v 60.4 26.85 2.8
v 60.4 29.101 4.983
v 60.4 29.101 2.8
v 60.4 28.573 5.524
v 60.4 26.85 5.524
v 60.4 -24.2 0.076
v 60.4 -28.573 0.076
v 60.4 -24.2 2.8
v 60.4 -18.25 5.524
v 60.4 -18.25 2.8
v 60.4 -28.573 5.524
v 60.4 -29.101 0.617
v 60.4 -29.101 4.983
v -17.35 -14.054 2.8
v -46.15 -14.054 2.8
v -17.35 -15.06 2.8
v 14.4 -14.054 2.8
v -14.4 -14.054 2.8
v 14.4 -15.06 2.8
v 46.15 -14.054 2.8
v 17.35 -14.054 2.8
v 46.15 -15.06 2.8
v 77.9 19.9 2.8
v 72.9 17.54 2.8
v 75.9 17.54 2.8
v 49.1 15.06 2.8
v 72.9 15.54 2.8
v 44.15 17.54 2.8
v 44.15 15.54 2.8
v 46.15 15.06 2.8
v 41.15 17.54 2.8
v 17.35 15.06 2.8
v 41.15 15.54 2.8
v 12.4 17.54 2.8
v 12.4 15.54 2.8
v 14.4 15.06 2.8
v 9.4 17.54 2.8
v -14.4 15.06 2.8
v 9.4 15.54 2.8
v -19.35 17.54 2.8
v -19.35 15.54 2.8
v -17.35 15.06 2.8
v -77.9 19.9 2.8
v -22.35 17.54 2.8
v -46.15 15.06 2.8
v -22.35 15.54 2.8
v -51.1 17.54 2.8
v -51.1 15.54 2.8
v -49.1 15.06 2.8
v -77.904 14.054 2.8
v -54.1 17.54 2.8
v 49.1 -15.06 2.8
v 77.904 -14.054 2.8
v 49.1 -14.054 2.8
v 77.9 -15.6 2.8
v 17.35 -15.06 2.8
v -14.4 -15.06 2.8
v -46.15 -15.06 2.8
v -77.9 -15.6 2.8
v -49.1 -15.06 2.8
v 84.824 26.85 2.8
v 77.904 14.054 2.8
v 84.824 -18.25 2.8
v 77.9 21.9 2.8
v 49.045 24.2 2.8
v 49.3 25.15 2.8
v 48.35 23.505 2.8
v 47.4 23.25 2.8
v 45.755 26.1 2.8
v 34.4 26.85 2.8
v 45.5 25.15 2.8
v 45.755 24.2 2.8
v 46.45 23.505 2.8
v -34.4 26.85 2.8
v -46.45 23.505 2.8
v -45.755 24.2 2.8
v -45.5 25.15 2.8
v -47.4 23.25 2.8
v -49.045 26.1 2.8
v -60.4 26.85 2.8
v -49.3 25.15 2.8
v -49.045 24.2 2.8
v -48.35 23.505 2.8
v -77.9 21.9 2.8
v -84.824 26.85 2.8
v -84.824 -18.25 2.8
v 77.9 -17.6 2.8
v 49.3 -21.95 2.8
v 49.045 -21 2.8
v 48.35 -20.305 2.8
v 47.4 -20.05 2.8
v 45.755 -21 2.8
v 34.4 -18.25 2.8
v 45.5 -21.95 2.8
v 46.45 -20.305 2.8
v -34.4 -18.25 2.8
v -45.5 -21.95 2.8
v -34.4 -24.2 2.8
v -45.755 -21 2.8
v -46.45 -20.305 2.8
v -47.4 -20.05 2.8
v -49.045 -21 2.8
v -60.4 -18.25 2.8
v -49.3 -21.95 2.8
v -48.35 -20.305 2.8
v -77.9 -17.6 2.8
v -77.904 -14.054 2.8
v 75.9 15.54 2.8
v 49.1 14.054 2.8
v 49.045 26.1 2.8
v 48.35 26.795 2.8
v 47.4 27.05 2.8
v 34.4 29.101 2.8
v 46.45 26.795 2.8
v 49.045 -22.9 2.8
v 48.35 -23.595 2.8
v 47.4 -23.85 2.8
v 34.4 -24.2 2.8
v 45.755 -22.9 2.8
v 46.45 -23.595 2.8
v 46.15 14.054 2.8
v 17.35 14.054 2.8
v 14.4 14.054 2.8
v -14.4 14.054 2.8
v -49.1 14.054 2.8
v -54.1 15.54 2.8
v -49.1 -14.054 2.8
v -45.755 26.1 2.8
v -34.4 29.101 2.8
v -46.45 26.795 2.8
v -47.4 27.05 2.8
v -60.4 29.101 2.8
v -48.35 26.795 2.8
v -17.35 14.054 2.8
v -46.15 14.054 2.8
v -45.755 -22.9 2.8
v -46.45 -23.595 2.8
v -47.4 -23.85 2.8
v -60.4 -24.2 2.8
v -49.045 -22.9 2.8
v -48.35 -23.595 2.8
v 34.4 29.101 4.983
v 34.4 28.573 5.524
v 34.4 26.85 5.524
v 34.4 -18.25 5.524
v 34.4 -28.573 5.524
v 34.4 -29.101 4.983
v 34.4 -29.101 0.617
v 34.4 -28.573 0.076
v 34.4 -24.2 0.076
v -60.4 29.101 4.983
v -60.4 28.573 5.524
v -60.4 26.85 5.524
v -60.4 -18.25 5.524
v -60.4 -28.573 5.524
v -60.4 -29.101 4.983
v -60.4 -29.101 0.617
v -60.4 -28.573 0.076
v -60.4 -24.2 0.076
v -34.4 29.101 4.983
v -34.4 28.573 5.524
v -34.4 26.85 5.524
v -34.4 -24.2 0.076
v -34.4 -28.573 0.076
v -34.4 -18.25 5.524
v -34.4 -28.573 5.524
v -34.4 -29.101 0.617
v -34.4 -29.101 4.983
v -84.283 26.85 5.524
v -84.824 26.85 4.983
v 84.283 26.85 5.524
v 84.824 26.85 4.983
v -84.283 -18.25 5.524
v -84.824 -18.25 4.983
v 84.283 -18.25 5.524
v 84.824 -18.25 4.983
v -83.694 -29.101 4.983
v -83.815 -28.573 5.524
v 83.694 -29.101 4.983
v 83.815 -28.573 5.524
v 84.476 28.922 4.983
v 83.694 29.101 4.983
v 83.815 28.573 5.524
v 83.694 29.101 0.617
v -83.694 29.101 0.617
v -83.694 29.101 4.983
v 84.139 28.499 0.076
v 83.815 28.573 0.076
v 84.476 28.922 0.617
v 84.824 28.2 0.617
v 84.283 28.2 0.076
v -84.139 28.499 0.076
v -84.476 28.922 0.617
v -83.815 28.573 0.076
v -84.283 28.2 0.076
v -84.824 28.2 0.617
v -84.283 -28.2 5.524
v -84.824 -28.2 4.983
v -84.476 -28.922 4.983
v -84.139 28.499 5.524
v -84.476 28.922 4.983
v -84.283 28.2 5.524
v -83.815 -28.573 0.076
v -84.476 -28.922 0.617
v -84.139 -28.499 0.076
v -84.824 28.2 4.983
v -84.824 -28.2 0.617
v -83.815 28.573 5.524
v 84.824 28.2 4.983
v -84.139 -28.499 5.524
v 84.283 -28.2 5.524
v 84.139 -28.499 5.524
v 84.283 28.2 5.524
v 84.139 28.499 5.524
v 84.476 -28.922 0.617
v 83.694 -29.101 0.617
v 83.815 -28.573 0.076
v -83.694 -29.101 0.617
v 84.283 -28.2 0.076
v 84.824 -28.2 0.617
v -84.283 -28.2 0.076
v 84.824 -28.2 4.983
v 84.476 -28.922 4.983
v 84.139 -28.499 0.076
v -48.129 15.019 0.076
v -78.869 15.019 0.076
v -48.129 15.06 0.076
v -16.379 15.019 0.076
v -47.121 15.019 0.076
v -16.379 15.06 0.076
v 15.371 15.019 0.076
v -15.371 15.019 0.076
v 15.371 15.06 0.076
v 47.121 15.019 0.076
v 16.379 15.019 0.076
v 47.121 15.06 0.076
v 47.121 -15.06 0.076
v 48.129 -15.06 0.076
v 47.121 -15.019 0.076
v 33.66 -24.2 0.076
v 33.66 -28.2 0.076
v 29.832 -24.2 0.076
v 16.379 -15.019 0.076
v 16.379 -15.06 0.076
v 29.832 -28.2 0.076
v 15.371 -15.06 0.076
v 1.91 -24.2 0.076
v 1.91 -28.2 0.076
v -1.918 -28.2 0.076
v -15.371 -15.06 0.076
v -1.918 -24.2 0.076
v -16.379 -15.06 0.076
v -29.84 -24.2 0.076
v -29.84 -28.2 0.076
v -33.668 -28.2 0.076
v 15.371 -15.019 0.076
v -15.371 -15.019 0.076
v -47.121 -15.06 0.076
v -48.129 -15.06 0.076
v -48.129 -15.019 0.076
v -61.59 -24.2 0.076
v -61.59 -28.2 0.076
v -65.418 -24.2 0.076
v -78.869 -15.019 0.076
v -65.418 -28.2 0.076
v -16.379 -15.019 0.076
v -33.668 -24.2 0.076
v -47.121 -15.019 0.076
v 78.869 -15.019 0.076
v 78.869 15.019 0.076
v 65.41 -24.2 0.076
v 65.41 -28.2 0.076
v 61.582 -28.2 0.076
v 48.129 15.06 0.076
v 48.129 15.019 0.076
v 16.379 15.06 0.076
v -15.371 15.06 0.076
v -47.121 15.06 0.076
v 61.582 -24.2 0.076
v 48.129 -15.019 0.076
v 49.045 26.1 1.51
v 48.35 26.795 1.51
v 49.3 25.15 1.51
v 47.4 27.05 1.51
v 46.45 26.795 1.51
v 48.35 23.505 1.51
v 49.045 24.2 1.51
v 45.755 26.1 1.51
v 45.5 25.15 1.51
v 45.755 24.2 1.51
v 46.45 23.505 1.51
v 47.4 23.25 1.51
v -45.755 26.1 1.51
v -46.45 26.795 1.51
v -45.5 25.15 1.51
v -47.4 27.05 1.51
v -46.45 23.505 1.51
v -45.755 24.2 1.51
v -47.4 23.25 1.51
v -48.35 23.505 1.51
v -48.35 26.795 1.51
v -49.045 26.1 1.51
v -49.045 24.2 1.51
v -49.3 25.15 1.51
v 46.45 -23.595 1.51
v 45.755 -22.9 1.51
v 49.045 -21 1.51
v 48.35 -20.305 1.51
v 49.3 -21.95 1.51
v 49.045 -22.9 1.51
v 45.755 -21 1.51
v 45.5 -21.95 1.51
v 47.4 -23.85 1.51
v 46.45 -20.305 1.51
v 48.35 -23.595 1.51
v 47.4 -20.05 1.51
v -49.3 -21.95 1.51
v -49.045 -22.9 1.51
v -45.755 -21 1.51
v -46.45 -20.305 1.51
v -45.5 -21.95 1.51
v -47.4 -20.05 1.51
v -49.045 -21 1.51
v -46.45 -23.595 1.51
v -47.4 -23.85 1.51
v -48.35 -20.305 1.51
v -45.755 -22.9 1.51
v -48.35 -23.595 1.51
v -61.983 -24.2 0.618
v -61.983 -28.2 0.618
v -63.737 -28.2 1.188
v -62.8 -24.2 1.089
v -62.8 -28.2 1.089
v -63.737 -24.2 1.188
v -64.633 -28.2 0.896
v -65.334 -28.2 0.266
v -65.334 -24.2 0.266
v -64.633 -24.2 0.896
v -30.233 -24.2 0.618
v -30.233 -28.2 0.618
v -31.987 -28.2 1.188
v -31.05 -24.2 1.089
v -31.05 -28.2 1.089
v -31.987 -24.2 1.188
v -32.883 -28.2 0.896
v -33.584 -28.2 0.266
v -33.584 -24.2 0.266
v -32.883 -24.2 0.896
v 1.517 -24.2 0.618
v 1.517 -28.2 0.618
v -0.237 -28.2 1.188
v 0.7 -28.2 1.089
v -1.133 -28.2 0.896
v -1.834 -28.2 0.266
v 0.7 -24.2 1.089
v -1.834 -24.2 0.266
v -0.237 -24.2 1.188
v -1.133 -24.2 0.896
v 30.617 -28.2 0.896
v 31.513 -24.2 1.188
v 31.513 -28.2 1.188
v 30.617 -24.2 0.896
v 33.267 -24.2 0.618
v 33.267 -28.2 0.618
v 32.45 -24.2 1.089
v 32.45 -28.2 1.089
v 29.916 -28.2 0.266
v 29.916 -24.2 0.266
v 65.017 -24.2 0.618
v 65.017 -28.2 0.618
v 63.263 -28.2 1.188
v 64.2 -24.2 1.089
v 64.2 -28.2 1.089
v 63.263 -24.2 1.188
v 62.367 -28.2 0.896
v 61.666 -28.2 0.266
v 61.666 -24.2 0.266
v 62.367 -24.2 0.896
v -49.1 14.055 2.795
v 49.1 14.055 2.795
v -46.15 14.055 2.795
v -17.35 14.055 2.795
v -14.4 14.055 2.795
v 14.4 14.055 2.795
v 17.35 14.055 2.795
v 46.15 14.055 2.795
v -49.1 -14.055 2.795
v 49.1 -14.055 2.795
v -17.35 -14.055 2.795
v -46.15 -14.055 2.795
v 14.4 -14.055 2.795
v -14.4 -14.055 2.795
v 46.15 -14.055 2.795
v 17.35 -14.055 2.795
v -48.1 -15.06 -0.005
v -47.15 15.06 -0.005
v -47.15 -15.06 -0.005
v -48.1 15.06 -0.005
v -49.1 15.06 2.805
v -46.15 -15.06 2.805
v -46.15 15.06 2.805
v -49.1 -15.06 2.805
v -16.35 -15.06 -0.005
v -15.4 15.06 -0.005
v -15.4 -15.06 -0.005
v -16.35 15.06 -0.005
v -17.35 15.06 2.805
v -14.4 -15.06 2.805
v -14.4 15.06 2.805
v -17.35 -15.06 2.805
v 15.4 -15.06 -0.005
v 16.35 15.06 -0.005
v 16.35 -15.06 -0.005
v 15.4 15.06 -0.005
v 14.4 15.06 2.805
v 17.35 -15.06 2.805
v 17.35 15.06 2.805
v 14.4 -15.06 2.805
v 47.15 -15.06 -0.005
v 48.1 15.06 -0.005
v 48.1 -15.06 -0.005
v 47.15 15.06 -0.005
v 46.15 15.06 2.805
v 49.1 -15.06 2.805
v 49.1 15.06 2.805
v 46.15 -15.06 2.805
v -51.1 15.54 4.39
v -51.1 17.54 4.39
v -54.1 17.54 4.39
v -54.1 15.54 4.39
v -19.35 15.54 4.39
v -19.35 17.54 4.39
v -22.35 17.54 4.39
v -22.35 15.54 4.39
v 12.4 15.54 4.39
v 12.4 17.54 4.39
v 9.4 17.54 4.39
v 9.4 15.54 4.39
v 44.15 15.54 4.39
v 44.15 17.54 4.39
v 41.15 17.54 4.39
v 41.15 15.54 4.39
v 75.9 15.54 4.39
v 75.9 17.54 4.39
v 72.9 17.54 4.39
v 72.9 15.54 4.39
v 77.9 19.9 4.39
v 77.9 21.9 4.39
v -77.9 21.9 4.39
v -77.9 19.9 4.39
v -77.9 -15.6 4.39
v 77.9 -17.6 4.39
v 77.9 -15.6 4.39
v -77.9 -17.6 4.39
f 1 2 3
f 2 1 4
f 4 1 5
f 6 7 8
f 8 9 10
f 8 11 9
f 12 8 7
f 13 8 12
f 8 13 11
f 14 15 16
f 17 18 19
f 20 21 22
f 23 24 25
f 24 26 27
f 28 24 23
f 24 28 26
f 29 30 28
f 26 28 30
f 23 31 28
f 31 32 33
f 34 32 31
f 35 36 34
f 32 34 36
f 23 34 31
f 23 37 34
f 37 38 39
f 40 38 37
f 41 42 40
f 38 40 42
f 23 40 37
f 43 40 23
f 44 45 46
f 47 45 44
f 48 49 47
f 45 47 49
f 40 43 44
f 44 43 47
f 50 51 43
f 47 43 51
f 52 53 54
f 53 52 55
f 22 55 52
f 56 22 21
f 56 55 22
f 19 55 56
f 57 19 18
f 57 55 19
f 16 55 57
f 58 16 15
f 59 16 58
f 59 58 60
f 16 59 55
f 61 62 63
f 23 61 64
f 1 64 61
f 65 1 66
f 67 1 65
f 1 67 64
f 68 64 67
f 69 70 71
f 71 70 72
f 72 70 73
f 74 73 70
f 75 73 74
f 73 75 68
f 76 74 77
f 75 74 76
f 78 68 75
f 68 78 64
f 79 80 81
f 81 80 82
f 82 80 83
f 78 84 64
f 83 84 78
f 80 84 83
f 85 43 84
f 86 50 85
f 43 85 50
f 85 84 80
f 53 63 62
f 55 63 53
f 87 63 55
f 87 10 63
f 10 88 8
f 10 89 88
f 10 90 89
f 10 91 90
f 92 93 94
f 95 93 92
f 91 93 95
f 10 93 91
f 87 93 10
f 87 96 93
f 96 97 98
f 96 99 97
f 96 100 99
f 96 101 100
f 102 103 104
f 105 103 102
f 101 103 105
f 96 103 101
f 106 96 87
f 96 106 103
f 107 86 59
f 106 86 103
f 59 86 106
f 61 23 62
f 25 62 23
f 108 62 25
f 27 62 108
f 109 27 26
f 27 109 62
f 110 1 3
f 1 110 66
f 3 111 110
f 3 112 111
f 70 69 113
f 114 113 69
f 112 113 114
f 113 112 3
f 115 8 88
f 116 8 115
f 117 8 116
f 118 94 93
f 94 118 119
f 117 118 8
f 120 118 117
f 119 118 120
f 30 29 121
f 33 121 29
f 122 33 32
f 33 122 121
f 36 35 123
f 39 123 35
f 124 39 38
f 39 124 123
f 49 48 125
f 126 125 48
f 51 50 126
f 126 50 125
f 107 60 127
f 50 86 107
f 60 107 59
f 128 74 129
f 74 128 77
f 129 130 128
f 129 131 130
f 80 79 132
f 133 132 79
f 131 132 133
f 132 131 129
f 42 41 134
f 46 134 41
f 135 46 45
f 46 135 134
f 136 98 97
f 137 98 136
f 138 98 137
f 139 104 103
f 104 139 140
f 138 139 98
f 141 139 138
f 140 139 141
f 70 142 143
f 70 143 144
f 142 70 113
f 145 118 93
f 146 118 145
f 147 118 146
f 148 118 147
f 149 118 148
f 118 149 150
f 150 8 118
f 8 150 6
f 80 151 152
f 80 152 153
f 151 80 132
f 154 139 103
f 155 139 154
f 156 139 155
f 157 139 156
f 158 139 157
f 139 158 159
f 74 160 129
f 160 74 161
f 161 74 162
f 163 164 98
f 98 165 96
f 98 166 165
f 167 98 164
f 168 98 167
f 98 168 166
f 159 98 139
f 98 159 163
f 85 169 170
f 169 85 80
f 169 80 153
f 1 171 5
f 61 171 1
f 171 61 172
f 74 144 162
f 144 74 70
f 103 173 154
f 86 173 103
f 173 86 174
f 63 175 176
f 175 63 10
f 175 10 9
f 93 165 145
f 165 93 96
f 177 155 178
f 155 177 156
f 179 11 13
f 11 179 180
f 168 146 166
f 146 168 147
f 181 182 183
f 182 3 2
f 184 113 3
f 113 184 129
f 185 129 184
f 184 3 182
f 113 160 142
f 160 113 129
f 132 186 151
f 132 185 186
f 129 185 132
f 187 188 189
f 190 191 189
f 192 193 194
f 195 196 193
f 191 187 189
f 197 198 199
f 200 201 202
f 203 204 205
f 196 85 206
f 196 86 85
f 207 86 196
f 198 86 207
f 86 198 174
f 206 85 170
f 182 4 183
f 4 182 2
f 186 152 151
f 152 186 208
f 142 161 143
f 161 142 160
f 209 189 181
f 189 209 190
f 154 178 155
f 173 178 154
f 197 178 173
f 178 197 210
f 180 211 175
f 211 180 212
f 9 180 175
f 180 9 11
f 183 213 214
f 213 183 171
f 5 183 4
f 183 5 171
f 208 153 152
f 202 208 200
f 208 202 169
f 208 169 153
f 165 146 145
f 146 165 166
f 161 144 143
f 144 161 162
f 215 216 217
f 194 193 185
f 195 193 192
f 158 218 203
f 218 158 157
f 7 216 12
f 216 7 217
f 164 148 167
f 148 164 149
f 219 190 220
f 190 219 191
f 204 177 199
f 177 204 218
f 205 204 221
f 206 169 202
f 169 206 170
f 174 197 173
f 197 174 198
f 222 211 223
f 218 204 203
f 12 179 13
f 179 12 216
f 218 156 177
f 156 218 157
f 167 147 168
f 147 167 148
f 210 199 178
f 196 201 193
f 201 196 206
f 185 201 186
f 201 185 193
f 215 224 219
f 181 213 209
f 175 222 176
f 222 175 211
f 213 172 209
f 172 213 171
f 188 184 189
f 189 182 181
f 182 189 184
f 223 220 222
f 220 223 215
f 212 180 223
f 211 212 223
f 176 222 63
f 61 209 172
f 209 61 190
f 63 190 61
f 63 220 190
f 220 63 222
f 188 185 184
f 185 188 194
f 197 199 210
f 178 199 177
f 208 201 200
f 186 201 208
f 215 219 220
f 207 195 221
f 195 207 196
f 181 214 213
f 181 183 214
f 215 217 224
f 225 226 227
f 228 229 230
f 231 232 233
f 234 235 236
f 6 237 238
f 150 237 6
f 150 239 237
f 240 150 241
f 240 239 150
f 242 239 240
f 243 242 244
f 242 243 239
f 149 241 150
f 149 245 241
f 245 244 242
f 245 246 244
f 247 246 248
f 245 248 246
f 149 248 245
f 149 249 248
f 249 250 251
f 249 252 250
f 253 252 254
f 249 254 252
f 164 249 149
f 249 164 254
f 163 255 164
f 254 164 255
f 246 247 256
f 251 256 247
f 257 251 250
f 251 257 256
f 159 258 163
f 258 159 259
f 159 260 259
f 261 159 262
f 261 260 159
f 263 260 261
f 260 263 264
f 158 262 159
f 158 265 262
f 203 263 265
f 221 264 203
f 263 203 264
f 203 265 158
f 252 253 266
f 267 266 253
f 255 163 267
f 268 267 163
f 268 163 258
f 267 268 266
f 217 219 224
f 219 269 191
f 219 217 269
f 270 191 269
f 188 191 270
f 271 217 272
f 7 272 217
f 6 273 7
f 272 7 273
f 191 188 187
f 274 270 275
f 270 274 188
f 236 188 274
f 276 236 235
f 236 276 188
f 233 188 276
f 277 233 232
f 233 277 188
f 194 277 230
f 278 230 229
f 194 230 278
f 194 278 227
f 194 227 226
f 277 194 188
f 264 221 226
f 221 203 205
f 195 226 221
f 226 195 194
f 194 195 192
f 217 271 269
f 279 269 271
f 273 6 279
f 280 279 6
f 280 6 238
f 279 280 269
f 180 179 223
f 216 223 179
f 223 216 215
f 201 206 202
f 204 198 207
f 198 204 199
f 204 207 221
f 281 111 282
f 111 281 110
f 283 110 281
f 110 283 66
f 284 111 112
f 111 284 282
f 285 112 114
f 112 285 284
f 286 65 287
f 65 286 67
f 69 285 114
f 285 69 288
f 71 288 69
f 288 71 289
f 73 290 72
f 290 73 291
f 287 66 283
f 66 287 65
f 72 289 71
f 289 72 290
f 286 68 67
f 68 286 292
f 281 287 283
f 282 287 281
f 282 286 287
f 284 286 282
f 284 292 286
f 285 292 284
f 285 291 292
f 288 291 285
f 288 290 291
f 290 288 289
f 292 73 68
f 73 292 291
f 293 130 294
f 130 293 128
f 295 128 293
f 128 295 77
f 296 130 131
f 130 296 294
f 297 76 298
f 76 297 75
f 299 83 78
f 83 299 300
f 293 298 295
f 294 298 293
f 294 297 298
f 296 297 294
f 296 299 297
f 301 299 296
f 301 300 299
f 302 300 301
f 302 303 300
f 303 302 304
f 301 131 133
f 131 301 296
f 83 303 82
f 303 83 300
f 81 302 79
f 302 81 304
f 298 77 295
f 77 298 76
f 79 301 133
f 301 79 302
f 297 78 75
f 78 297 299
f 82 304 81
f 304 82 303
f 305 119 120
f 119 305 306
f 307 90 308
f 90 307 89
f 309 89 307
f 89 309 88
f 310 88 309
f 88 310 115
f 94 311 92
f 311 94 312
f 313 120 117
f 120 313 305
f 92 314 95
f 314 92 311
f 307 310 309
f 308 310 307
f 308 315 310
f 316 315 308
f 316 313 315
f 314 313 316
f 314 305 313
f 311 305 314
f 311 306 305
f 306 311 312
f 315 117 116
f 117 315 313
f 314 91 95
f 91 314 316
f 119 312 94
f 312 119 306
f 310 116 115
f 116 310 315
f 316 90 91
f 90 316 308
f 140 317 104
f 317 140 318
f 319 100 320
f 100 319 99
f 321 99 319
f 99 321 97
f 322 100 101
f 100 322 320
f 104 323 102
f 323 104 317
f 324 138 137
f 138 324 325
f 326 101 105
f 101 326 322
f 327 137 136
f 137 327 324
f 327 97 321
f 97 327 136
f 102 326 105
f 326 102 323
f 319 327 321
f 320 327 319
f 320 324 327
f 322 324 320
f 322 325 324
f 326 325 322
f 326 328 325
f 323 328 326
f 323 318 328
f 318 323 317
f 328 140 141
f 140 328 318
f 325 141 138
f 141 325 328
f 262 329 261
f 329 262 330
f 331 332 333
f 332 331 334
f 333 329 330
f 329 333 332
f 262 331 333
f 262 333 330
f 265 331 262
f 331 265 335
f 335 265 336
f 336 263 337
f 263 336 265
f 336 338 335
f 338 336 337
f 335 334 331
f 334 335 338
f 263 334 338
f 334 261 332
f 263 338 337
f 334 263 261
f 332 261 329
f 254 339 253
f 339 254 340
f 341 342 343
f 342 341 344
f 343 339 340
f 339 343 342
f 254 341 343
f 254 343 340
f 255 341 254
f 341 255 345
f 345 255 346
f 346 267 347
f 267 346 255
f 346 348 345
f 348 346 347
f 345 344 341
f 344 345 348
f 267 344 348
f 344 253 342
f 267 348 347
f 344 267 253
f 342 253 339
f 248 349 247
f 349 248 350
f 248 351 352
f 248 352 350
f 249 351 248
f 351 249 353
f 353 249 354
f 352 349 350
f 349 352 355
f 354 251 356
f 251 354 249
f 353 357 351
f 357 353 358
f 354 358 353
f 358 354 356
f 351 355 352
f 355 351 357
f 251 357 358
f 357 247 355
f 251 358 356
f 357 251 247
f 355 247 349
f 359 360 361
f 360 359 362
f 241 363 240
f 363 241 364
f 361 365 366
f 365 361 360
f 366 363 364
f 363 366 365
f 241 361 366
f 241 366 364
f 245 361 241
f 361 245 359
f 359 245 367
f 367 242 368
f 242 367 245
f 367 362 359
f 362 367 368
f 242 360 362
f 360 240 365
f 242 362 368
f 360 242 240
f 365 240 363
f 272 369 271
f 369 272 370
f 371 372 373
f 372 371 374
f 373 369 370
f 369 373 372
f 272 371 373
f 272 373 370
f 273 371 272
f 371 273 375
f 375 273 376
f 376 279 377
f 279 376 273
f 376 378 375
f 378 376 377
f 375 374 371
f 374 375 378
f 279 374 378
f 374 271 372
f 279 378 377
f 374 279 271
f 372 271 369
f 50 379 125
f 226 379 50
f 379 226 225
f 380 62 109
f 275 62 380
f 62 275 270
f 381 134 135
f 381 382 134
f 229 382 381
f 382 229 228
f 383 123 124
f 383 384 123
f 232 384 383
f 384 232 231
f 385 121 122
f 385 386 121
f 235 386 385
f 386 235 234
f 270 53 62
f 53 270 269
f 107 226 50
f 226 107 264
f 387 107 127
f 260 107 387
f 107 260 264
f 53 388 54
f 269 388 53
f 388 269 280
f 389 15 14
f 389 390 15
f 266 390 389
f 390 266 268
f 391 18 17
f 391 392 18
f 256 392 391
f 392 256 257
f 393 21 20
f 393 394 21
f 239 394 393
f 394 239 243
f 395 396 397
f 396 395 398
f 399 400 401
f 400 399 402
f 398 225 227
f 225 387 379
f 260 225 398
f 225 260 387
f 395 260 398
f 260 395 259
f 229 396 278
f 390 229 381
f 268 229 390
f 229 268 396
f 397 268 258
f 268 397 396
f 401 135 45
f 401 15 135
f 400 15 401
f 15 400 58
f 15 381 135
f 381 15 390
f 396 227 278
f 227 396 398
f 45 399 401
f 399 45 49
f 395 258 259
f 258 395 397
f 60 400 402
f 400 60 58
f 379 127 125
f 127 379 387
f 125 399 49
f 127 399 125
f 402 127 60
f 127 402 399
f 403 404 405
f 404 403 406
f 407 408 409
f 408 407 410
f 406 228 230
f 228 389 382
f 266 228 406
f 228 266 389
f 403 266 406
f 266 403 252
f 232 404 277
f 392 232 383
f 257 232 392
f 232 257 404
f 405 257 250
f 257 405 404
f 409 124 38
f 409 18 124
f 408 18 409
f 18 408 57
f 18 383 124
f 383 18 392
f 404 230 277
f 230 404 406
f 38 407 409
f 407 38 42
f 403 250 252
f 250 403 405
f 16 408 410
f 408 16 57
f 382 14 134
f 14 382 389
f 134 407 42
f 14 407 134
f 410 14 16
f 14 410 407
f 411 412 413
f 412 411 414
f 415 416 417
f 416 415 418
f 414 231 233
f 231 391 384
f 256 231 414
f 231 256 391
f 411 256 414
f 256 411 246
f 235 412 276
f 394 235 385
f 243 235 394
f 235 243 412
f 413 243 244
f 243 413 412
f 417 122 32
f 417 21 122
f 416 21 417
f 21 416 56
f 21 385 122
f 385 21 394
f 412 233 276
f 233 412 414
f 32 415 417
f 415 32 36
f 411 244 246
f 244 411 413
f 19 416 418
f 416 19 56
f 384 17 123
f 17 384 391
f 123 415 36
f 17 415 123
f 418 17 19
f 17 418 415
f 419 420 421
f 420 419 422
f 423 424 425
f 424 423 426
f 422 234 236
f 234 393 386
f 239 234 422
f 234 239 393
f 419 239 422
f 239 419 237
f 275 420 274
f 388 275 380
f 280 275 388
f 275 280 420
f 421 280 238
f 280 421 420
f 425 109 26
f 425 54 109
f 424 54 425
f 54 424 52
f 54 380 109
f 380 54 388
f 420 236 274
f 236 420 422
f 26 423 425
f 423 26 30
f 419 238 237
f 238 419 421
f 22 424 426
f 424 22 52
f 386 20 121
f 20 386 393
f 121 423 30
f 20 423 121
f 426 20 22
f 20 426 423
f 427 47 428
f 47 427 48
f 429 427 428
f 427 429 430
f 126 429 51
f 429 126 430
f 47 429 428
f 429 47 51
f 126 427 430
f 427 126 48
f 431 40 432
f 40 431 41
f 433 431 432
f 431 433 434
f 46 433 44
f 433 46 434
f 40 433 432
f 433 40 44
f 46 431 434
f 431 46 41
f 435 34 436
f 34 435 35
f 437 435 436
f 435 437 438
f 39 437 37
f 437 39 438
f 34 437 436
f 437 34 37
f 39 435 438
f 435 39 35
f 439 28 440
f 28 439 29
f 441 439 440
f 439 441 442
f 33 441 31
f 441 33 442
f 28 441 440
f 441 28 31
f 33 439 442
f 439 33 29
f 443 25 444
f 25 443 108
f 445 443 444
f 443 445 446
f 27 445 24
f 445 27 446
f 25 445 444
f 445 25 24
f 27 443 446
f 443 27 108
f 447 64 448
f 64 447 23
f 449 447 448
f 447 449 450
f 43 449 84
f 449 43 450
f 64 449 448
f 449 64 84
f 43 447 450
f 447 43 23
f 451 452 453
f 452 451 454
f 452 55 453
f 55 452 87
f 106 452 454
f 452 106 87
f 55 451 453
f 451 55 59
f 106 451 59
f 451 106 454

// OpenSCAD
// -*- mode: SCAD ; c-file-style: "ellemtel" ; coding: utf-8 -*-
//
// Holder to scan 126 film strips with a Reflecta ProScan 10T
//
// Copyright 2018 Roland Sieker <ospalh@gmail.com>
// Licence: CC-BY-SA 4.0


/* [Global] */


// ... to preview. You will get both parts when you click "Create Thing".
part = "halter"; // [halter: film holder, einsatz: film holder clamp]

// Set this to "render" and click on "Create Thing" when done with the setup.
preview = 1; // [0:render, 1:preview]

/* [Holder] */

// Width of the holder. This one and the next one are the two values you do need to set up for your scanner. Preset is for a Reflecta proScan. Maybe subtract half a millimtre for a better fit.
holder_width = 58.4;  // [20:0.1:150]

// Height or thickness of the holder. See above. You know they were too high when you need a mallet to go from one image to the next...
holder_thickness = 5.6;  // [3:0.1:10]

// How many exposures on the longest strips you want to fit into this. Make sure the resulting holder still fits onto your print bed.
images_per_strip = 5;  // [1:1:8]

// Different manufacturers' scanner place their little catches to position the holder at different sides.
position_notch_side = 90;  // [90: bottom, 0: side]

/* [Magnets] */

// Diameter of the magnet hole. Add clearance by hand here. Set to 0 for no magnet holes.
magnet_diameter = 3.8;  // [0:0.1:15]
// Height or thickness of the magnet. Make sure to use magnets flat enough to fit.
magnet_height = 1;  // [0.5:0.1:3]

/* [Hidden] */

// Das ganze Filmgroessen-Geraffel wieder verstecken: ein thing pro
// Film. Teil der Automatik (mit/ohne Stege, Lang-oder Kurzkerbe) sind so
// halbwegs inaktiv.


// Width of the film
film_width = 35;  // [8:0.1:70]
// Length from the left edge of an exposure to its right edge
image_width = 28.8; // [8:0.1:100]
image_pitch = 127/4;  // Ein Viererstreifen ist genau 127 mm lang. Das ist
// irgendwie was rundes in Zoellen. Das muss mich nicht scheren.

// Size of an exposure from bottom to top.
image_height = 28.1; // Hat sich was, "quadratishc". Nachmessen hat ergeben, dass die Bilder etwas breiter als hoch sind.
rand_unten = 5.6;  // Koennten 7/32 Zoll sein. What TF ever. Ich koennte 118 Schweizerfranken bezahlen und es im Standard nachlesen. Oder das Geld sparen
rand_oben = film_width - image_height - rand_unten;
echo("rand_oben", rand_oben);

bildabstand = max(image_pitch, image_width);
l_filmsteg = max(0, bildabstand-image_width);
r_r = 1.0;  // Rundungsradius
// Auch wichtig:
l_zk = 4;  // Laenge Zentrierkerbe
b_zk = 4;  // Breite Zentrierkerbe
h_zk = 1.2;  // Tiefe der Zentrierkerbe
w_zk = 1;  // Wand bzw Abstand der Zentrierkerbe vom Rand

min_l_ksteg = 0.8;

l_griff = 25;
o_griff = 25;
w_griff = 3;


w_schraeg = 1;  // Breite der Abschraegung rund um die Filmfenster

kurzsteg_grenze = w_schraeg;  // Weniger als 1 mm pro Seite: Kurzstege

mit_langsteg_oben = ( rand_oben >= kurzsteg_grenze);
mit_langsteg_unten = ( rand_unten >= kurzsteg_grenze);


w_steg = 2;  // Breite fuer Stuecke, die den Film zentrieren.
l_kurzsteg = 0.4*bildabstand;  // Laenge fuer Stuecke, die den Film zentrieren,
// wenn wir keine Fensterstege machen


magnet_off_oben = -2;
magnet_off_unten = 1.2;

w_filmloch = 2.5; // Ein zehntel Zoll?
l_filmloch = 3.5; // ca. 35/254 Zoll.
// dy_fl_bl = 1.25; // Abstand Filmloch oben zum Blidbereich
dy_fl_k = 1.86;  // Abstand Filmloch unten zur Filmkante
dx_fl_rl = 1.75;  // Abstand Filmloch links zum Rahmen links

// *******************************************************
// Extra parameters. These can be changed reasonably safely.


w = 1.8;  // Wall width
p = 1.2;  // Bottom, top plate height
c = 0.5;  // Clearance
c_z = 0.3;  // Clearance in z direction. Mostly for the magnet hole and centering ridge
angle = 60; // Overhangs much below 60 degrees are a problem for me


// Halbwegs wichtig
h_steg = 1.6;  // Hoehe fuer Stuecke, die den Film zentrieren.
h_nut = h_steg + c_z;  // Tiefe fuer Stuecke, auf denen der Film nicht aufliegt



// *******************************************************
// Some shortcuts. These shouldn't be changed

tau = 2 * PI;  // pi is still wrong. tau = circumference / r

xy_factor = 1/tan(angle);
// To get from a height to a horizontal width inclined correctly
z_factor = tan(angle);  // The other way around

some_distance = 1.2 * holder_width;
ms = 0.01;  // Muggeseggele.

// fn for differently sized objects and fs, fa; all for preview or rendering.
pna = 40;
pnb = 15;
pa = 5;
ps = 1;
rna = 180;
rnb = 30;
ra = 1;
rs = 0.1;
function na() = (preview) ? pna : rna;
function nb() = (preview) ? pnb : rnb;
$fs = (preview) ? ps : rs;
$fa = (preview) ? pa : ra;

// l_fenster = bildabstand * images_per_strip;
l_fenster = bildabstand * (images_per_strip - 1) + image_width;
l_rand = 2 * w_steg + w_schraeg + 2;
w_rand = w_schraeg + 7;
l_ue_a =  l_fenster + 2*l_rand;
w_einsatz = image_height + 2 * w_rand;
h_bd = holder_thickness/2;  // Hoehe Boden oder Deckel

to_griff = l_ue_a/2 - o_griff - l_griff/2;



// *******************************************************
// End setup




// *******************************************************
// Generate the parts


print_part();
// filmhalter();
// einsatz();
// preview_parts();
// stack_parts();



module print_part()
{
   if ("halter" == part)
   {
      filmhalter();
   }
   if ("einsatz" == part)
   {
      einsatz();
   }
}

module preview_parts()
{
   filmhalter();
   translate([0, some_distance, 0])
   {
      einsatz();
   }
}

module stack_parts()
{
   // intersection()
   {
       // color("yellow")
      {
         filmhalter();
      }
      translate([0,0,holder_thickness + ms])
      {
         rotate([0,180,0])
         {
            // color("red")
            {
               einsatz();
            }
         }
      }
   }
}

// *******************************************************
// Code for the parts themselves


module filmhalter()
{
   difference()
   {
      basis_filmhalter();
      fenster();
      magnetausschnitte();
      kerben(false);
   }
   fensterstege();
   bodenstege();
}

module einsatz()
{
   difference()
   {
      union()
      {
         difference()
         {
            basis_einsatz();
            fenster();
         }
         fensterstege();
      }
      einsatzausschnitte();
      // magnetausschnitte(magnet_diameter/2);
      magnetausschnitte();
      kerben(true);
   }

}


module basis_filmhalter()
{
   translate([0,0,h_bd])
   {
      difference()
      {
         massiver_halter();
         einsatz_ausschnitt(2*c);
      }
   }
}


module basis_einsatz()
{
   translate([0,0,h_bd])
   {
      intersection()
      {
         massiver_halter();
         rotate([0,180,0])
         {
            einsatz_ausschnitt(0);
         }
      }
   }

}

module massiver_halter()
{
   hull()
   {
      vosp();
      mirror([0,0,1])
      {
         vosp();
      }
   }

   module vosp()
   {
      tosp();
      mirror([0,1,0])
      {
         tosp();
      }
   }
   module tosp()
   {
      osp();
      mirror([1,0,0])
      {
         osp();
      }

   }

   module osp()
   {
      translate([l_ue_a/2-r_r, holder_width/2-r_r, holder_thickness/2-r_r])
      {
         sphere(r=r_r);
      }
   }
}


module einsatz_ausschnitt(ec)
{
   translate([0, 0, holder_thickness])
   {
      translate([0, rand_unten - rand_oben, 0])
      cube([l_ue_a+2*ms, w_einsatz + ec, 2*holder_thickness], center=true);
      grip_cut();
      mirror()
      {
         grip_cut();
      }
   }
   module grip_cut()
   {
      translate([to_griff, 0, 0])
      {
         cube([l_griff + ec, holder_width + 2*ms, 2*holder_thickness], center=true);
         translate([0, -holder_width/2, 0])
         {
            cube([l_griff + ec, 2*w_griff+4*ec, 4*holder_thickness], center=true);
         }
      }
   }
}

module fenster()
{
   translate([0, 0, h_bd])
   {
      hull()
      {
         translate([0,0,-0.5+ms])
         {
            cube([l_fenster, image_height, 1], center=true);
         }
         translate([0,0,-h_bd-0.5-ms])
         {
            cube(
               [l_fenster+2*w_schraeg, image_height+2*w_schraeg, 1], center=true);
         }
      }

   }
}


module magnetausschnitte()
{
   if (magnet_diameter > 0 && magnet_height > 0)
   {
      yo_mag = w_einsatz/2 + magnet_diameter/2;
      magnetausschnitt(to_griff, yo_mag + magnet_off_unten);
      magnetausschnitt(-to_griff, yo_mag + magnet_off_unten);
      magnetausschnitt(to_griff, -yo_mag - magnet_off_oben);
      magnetausschnitt(-to_griff, -yo_mag - magnet_off_oben);
   }
}

module magnetausschnitt(exo, eyo)
{


   // Mittig in den Griffen.
   translate(
      [exo, eyo, h_bd - magnet_height-c_z + ms])
   {
      cylinder(d=magnet_diameter, h=magnet_height+c_z);
      // N.B. Spiel ist schon im magnet_diameter eingerechnet
   }
}

module bodenstege()
{
   translate([0, 0, -ms+h_steg/2+h_bd])
   {
      if (mit_langsteg_unten)
      {
         langbodensteg(rand_unten);
      }
      else
      {
         kurzbodenstege(rand_unten);
      }
      if (mit_langsteg_oben)
      {
         rotate(180)
         {
            langbodensteg(rand_oben);
         }
      }
      else
      {
         rotate(180)
         {
            kurzbodenstege(rand_oben);
         }
      }
      zentriernasen();
   }
   module langbodensteg(eo)
   {
      translate([0,w_steg/2+image_height/2+c/2+eo, 0])
      {
         cube([l_fenster, w_steg, h_steg], center=true);
      }
   }
   module kurzbodenstege(eo)
   {
      for (i=[0:images_per_strip-1])
      {
         translate([-l_fenster/2 + (0.5 + i) * bildabstand, w_steg/2+image_height/2+eo+c/2, 0])
         {
            cube([l_kurzsteg, w_steg, h_steg], center=true);
         }
      }
   }
   module zentriernasen()
   {
      for (i=[0:1:images_per_strip-1])
      {
         // Irgendwie ist "oben" und "unten" verkehrt. Fuer Teile unten braucht mensch positive y-Werte.
         translate(
            [-l_fenster/2 + i * bildabstand-l_filmloch+image_width+c/2-dx_fl_rl,
             +image_height/2 + rand_unten - w_filmloch -dy_fl_k+ c/2 , -h_steg/2])
         {
            cube([l_filmloch-c, w_filmloch-c, h_steg]);
         }
      }
   }
}

module einsatzausschnitte()
{
   translate([0, 0, h_bd + ms-h_nut/2])
   {
      if (mit_langsteg_unten)
      {
         langausschnitt(rand_unten);
      }
      else
      {
         kurzausschnitte(rand_unten);
      }
      if (mit_langsteg_oben)
      {
         rotate(180)
         {
            langausschnitt(rand_oben);
         }
      }
      else
      {
         rotate(180)
         {
            kurzausschnitte(rand_oben);
         }
      }
      zentrierausschnitte();
   }
   module langausschnitt(eyo)
   {
      translate([0,w_steg/2+image_height/2+eyo+c/2,0])
      {
         cube([l_fenster+6*c, w_steg+2*c, h_nut], center=true);
      }
   }
   module kurzausschnitte(eyo)
   {
      for (i=[0:images_per_strip-1])
      {
         translate(
            [-l_fenster/2 + (0.5 + i) * bildabstand,
             w_steg/2+image_height/2+eyo+c/2-film_width/4 + image_height/4, 0])
         {
            cube(
               [l_kurzsteg+2*c, w_steg+2*c+film_width/2 - image_height/2,
                h_nut], center=true);
         }
      }
   }
      module zentrierausschnitte()
   {
      for (i=[0:images_per_strip-1])
      {
         translate(
            [-l_fenster/2 + i * bildabstand-c/2+dx_fl_rl,
             +image_height/2 + rand_unten - w_filmloch -dy_fl_k- c/2 , -h_nut/2])
         {
            cube([l_filmloch+c, w_filmloch+c, h_nut]);
         }
      }
   }
}


module fensterstege()
{
   if (l_filmsteg > 0)
   {
      for (i=[0.5:1:images_per_strip-1.5])
      {
         translate([-l_fenster/2 + i * bildabstand + image_width/2, 0, 0])
         {
            if (l_filmsteg < min_l_ksteg)
            {
               quader_fenstersteg();
            }
            else
            {
               keil_fenstersteg();
            }
         }
      }
   }
   module quader_fenstersteg()
   {
      translate([0,0,h_bd/2-ms])
      {
         cube([l_filmsteg, image_height+2*w_schraeg + 2*ms ,h_bd], center=true);
      }
   }
   module keil_fenstersteg()
   {
      l_fsb = max(l_filmsteg-2*w_schraeg,min_l_ksteg);
      ihp = image_height + 2*w_schraeg + 2*ms;
      echo("fenstersteg am boden",l_fsb);
      hull()
      {
         translate([0,0,h_bd])
         {
            cube([l_filmsteg, ihp, ms], center=true);
         }
         //  translate([0,0,-ms])
         cube([l_fsb, ihp, ms], center=true);
      }
   }
}


module kerben(oben)
{
   // Den Radius der Zentrierkerbe kann mensch per Pythagoras bestimmen.
   // Hypothenuse = r_zk
   // 1. Kathete = l_zk/2
   // 2. Kathete = r_zk - h_zk
   // h_zk > 0
   // r_zk * r_zk = l_zk * l_zk / 4 + r_zk * r_zk - 2 * r_zk * h_zk + h_zk * h_zk
   // 0 = l_zk * l_zk / 4 - 2 * r_zk * h_zk + h_zk * h_zk
   // 2 * r_zk * h_zk =
   r_zk = (l_zk * l_zk / 4 + h_zk * h_zk) / (2 * h_zk);
   // Die Variable heisst "position_notch_side", und enthaelt einen Winkel. Funktioniert.
   dz_zk = (position_notch_side > 0) ?
      ( (oben) ? holder_thickness - h_zk + r_zk : h_zk-r_zk) :
      -ms;
   ahzk = (position_notch_side > 0) ? b_zk : holder_thickness + 2*ms;
   hk_yo = (position_notch_side > 0) ? -w_zk - b_zk : r_zk -h_zk;
   for (i=[0:images_per_strip-1])
   {
      translate(
         [-l_fenster/2 + i * bildabstand + image_width/2, -holder_width/2 -hk_yo, dz_zk])
      {
         rotate([position_notch_side,0,0])
         {
            cylinder(r=r_zk, h=ahzk);
         }
      }
   }

}
